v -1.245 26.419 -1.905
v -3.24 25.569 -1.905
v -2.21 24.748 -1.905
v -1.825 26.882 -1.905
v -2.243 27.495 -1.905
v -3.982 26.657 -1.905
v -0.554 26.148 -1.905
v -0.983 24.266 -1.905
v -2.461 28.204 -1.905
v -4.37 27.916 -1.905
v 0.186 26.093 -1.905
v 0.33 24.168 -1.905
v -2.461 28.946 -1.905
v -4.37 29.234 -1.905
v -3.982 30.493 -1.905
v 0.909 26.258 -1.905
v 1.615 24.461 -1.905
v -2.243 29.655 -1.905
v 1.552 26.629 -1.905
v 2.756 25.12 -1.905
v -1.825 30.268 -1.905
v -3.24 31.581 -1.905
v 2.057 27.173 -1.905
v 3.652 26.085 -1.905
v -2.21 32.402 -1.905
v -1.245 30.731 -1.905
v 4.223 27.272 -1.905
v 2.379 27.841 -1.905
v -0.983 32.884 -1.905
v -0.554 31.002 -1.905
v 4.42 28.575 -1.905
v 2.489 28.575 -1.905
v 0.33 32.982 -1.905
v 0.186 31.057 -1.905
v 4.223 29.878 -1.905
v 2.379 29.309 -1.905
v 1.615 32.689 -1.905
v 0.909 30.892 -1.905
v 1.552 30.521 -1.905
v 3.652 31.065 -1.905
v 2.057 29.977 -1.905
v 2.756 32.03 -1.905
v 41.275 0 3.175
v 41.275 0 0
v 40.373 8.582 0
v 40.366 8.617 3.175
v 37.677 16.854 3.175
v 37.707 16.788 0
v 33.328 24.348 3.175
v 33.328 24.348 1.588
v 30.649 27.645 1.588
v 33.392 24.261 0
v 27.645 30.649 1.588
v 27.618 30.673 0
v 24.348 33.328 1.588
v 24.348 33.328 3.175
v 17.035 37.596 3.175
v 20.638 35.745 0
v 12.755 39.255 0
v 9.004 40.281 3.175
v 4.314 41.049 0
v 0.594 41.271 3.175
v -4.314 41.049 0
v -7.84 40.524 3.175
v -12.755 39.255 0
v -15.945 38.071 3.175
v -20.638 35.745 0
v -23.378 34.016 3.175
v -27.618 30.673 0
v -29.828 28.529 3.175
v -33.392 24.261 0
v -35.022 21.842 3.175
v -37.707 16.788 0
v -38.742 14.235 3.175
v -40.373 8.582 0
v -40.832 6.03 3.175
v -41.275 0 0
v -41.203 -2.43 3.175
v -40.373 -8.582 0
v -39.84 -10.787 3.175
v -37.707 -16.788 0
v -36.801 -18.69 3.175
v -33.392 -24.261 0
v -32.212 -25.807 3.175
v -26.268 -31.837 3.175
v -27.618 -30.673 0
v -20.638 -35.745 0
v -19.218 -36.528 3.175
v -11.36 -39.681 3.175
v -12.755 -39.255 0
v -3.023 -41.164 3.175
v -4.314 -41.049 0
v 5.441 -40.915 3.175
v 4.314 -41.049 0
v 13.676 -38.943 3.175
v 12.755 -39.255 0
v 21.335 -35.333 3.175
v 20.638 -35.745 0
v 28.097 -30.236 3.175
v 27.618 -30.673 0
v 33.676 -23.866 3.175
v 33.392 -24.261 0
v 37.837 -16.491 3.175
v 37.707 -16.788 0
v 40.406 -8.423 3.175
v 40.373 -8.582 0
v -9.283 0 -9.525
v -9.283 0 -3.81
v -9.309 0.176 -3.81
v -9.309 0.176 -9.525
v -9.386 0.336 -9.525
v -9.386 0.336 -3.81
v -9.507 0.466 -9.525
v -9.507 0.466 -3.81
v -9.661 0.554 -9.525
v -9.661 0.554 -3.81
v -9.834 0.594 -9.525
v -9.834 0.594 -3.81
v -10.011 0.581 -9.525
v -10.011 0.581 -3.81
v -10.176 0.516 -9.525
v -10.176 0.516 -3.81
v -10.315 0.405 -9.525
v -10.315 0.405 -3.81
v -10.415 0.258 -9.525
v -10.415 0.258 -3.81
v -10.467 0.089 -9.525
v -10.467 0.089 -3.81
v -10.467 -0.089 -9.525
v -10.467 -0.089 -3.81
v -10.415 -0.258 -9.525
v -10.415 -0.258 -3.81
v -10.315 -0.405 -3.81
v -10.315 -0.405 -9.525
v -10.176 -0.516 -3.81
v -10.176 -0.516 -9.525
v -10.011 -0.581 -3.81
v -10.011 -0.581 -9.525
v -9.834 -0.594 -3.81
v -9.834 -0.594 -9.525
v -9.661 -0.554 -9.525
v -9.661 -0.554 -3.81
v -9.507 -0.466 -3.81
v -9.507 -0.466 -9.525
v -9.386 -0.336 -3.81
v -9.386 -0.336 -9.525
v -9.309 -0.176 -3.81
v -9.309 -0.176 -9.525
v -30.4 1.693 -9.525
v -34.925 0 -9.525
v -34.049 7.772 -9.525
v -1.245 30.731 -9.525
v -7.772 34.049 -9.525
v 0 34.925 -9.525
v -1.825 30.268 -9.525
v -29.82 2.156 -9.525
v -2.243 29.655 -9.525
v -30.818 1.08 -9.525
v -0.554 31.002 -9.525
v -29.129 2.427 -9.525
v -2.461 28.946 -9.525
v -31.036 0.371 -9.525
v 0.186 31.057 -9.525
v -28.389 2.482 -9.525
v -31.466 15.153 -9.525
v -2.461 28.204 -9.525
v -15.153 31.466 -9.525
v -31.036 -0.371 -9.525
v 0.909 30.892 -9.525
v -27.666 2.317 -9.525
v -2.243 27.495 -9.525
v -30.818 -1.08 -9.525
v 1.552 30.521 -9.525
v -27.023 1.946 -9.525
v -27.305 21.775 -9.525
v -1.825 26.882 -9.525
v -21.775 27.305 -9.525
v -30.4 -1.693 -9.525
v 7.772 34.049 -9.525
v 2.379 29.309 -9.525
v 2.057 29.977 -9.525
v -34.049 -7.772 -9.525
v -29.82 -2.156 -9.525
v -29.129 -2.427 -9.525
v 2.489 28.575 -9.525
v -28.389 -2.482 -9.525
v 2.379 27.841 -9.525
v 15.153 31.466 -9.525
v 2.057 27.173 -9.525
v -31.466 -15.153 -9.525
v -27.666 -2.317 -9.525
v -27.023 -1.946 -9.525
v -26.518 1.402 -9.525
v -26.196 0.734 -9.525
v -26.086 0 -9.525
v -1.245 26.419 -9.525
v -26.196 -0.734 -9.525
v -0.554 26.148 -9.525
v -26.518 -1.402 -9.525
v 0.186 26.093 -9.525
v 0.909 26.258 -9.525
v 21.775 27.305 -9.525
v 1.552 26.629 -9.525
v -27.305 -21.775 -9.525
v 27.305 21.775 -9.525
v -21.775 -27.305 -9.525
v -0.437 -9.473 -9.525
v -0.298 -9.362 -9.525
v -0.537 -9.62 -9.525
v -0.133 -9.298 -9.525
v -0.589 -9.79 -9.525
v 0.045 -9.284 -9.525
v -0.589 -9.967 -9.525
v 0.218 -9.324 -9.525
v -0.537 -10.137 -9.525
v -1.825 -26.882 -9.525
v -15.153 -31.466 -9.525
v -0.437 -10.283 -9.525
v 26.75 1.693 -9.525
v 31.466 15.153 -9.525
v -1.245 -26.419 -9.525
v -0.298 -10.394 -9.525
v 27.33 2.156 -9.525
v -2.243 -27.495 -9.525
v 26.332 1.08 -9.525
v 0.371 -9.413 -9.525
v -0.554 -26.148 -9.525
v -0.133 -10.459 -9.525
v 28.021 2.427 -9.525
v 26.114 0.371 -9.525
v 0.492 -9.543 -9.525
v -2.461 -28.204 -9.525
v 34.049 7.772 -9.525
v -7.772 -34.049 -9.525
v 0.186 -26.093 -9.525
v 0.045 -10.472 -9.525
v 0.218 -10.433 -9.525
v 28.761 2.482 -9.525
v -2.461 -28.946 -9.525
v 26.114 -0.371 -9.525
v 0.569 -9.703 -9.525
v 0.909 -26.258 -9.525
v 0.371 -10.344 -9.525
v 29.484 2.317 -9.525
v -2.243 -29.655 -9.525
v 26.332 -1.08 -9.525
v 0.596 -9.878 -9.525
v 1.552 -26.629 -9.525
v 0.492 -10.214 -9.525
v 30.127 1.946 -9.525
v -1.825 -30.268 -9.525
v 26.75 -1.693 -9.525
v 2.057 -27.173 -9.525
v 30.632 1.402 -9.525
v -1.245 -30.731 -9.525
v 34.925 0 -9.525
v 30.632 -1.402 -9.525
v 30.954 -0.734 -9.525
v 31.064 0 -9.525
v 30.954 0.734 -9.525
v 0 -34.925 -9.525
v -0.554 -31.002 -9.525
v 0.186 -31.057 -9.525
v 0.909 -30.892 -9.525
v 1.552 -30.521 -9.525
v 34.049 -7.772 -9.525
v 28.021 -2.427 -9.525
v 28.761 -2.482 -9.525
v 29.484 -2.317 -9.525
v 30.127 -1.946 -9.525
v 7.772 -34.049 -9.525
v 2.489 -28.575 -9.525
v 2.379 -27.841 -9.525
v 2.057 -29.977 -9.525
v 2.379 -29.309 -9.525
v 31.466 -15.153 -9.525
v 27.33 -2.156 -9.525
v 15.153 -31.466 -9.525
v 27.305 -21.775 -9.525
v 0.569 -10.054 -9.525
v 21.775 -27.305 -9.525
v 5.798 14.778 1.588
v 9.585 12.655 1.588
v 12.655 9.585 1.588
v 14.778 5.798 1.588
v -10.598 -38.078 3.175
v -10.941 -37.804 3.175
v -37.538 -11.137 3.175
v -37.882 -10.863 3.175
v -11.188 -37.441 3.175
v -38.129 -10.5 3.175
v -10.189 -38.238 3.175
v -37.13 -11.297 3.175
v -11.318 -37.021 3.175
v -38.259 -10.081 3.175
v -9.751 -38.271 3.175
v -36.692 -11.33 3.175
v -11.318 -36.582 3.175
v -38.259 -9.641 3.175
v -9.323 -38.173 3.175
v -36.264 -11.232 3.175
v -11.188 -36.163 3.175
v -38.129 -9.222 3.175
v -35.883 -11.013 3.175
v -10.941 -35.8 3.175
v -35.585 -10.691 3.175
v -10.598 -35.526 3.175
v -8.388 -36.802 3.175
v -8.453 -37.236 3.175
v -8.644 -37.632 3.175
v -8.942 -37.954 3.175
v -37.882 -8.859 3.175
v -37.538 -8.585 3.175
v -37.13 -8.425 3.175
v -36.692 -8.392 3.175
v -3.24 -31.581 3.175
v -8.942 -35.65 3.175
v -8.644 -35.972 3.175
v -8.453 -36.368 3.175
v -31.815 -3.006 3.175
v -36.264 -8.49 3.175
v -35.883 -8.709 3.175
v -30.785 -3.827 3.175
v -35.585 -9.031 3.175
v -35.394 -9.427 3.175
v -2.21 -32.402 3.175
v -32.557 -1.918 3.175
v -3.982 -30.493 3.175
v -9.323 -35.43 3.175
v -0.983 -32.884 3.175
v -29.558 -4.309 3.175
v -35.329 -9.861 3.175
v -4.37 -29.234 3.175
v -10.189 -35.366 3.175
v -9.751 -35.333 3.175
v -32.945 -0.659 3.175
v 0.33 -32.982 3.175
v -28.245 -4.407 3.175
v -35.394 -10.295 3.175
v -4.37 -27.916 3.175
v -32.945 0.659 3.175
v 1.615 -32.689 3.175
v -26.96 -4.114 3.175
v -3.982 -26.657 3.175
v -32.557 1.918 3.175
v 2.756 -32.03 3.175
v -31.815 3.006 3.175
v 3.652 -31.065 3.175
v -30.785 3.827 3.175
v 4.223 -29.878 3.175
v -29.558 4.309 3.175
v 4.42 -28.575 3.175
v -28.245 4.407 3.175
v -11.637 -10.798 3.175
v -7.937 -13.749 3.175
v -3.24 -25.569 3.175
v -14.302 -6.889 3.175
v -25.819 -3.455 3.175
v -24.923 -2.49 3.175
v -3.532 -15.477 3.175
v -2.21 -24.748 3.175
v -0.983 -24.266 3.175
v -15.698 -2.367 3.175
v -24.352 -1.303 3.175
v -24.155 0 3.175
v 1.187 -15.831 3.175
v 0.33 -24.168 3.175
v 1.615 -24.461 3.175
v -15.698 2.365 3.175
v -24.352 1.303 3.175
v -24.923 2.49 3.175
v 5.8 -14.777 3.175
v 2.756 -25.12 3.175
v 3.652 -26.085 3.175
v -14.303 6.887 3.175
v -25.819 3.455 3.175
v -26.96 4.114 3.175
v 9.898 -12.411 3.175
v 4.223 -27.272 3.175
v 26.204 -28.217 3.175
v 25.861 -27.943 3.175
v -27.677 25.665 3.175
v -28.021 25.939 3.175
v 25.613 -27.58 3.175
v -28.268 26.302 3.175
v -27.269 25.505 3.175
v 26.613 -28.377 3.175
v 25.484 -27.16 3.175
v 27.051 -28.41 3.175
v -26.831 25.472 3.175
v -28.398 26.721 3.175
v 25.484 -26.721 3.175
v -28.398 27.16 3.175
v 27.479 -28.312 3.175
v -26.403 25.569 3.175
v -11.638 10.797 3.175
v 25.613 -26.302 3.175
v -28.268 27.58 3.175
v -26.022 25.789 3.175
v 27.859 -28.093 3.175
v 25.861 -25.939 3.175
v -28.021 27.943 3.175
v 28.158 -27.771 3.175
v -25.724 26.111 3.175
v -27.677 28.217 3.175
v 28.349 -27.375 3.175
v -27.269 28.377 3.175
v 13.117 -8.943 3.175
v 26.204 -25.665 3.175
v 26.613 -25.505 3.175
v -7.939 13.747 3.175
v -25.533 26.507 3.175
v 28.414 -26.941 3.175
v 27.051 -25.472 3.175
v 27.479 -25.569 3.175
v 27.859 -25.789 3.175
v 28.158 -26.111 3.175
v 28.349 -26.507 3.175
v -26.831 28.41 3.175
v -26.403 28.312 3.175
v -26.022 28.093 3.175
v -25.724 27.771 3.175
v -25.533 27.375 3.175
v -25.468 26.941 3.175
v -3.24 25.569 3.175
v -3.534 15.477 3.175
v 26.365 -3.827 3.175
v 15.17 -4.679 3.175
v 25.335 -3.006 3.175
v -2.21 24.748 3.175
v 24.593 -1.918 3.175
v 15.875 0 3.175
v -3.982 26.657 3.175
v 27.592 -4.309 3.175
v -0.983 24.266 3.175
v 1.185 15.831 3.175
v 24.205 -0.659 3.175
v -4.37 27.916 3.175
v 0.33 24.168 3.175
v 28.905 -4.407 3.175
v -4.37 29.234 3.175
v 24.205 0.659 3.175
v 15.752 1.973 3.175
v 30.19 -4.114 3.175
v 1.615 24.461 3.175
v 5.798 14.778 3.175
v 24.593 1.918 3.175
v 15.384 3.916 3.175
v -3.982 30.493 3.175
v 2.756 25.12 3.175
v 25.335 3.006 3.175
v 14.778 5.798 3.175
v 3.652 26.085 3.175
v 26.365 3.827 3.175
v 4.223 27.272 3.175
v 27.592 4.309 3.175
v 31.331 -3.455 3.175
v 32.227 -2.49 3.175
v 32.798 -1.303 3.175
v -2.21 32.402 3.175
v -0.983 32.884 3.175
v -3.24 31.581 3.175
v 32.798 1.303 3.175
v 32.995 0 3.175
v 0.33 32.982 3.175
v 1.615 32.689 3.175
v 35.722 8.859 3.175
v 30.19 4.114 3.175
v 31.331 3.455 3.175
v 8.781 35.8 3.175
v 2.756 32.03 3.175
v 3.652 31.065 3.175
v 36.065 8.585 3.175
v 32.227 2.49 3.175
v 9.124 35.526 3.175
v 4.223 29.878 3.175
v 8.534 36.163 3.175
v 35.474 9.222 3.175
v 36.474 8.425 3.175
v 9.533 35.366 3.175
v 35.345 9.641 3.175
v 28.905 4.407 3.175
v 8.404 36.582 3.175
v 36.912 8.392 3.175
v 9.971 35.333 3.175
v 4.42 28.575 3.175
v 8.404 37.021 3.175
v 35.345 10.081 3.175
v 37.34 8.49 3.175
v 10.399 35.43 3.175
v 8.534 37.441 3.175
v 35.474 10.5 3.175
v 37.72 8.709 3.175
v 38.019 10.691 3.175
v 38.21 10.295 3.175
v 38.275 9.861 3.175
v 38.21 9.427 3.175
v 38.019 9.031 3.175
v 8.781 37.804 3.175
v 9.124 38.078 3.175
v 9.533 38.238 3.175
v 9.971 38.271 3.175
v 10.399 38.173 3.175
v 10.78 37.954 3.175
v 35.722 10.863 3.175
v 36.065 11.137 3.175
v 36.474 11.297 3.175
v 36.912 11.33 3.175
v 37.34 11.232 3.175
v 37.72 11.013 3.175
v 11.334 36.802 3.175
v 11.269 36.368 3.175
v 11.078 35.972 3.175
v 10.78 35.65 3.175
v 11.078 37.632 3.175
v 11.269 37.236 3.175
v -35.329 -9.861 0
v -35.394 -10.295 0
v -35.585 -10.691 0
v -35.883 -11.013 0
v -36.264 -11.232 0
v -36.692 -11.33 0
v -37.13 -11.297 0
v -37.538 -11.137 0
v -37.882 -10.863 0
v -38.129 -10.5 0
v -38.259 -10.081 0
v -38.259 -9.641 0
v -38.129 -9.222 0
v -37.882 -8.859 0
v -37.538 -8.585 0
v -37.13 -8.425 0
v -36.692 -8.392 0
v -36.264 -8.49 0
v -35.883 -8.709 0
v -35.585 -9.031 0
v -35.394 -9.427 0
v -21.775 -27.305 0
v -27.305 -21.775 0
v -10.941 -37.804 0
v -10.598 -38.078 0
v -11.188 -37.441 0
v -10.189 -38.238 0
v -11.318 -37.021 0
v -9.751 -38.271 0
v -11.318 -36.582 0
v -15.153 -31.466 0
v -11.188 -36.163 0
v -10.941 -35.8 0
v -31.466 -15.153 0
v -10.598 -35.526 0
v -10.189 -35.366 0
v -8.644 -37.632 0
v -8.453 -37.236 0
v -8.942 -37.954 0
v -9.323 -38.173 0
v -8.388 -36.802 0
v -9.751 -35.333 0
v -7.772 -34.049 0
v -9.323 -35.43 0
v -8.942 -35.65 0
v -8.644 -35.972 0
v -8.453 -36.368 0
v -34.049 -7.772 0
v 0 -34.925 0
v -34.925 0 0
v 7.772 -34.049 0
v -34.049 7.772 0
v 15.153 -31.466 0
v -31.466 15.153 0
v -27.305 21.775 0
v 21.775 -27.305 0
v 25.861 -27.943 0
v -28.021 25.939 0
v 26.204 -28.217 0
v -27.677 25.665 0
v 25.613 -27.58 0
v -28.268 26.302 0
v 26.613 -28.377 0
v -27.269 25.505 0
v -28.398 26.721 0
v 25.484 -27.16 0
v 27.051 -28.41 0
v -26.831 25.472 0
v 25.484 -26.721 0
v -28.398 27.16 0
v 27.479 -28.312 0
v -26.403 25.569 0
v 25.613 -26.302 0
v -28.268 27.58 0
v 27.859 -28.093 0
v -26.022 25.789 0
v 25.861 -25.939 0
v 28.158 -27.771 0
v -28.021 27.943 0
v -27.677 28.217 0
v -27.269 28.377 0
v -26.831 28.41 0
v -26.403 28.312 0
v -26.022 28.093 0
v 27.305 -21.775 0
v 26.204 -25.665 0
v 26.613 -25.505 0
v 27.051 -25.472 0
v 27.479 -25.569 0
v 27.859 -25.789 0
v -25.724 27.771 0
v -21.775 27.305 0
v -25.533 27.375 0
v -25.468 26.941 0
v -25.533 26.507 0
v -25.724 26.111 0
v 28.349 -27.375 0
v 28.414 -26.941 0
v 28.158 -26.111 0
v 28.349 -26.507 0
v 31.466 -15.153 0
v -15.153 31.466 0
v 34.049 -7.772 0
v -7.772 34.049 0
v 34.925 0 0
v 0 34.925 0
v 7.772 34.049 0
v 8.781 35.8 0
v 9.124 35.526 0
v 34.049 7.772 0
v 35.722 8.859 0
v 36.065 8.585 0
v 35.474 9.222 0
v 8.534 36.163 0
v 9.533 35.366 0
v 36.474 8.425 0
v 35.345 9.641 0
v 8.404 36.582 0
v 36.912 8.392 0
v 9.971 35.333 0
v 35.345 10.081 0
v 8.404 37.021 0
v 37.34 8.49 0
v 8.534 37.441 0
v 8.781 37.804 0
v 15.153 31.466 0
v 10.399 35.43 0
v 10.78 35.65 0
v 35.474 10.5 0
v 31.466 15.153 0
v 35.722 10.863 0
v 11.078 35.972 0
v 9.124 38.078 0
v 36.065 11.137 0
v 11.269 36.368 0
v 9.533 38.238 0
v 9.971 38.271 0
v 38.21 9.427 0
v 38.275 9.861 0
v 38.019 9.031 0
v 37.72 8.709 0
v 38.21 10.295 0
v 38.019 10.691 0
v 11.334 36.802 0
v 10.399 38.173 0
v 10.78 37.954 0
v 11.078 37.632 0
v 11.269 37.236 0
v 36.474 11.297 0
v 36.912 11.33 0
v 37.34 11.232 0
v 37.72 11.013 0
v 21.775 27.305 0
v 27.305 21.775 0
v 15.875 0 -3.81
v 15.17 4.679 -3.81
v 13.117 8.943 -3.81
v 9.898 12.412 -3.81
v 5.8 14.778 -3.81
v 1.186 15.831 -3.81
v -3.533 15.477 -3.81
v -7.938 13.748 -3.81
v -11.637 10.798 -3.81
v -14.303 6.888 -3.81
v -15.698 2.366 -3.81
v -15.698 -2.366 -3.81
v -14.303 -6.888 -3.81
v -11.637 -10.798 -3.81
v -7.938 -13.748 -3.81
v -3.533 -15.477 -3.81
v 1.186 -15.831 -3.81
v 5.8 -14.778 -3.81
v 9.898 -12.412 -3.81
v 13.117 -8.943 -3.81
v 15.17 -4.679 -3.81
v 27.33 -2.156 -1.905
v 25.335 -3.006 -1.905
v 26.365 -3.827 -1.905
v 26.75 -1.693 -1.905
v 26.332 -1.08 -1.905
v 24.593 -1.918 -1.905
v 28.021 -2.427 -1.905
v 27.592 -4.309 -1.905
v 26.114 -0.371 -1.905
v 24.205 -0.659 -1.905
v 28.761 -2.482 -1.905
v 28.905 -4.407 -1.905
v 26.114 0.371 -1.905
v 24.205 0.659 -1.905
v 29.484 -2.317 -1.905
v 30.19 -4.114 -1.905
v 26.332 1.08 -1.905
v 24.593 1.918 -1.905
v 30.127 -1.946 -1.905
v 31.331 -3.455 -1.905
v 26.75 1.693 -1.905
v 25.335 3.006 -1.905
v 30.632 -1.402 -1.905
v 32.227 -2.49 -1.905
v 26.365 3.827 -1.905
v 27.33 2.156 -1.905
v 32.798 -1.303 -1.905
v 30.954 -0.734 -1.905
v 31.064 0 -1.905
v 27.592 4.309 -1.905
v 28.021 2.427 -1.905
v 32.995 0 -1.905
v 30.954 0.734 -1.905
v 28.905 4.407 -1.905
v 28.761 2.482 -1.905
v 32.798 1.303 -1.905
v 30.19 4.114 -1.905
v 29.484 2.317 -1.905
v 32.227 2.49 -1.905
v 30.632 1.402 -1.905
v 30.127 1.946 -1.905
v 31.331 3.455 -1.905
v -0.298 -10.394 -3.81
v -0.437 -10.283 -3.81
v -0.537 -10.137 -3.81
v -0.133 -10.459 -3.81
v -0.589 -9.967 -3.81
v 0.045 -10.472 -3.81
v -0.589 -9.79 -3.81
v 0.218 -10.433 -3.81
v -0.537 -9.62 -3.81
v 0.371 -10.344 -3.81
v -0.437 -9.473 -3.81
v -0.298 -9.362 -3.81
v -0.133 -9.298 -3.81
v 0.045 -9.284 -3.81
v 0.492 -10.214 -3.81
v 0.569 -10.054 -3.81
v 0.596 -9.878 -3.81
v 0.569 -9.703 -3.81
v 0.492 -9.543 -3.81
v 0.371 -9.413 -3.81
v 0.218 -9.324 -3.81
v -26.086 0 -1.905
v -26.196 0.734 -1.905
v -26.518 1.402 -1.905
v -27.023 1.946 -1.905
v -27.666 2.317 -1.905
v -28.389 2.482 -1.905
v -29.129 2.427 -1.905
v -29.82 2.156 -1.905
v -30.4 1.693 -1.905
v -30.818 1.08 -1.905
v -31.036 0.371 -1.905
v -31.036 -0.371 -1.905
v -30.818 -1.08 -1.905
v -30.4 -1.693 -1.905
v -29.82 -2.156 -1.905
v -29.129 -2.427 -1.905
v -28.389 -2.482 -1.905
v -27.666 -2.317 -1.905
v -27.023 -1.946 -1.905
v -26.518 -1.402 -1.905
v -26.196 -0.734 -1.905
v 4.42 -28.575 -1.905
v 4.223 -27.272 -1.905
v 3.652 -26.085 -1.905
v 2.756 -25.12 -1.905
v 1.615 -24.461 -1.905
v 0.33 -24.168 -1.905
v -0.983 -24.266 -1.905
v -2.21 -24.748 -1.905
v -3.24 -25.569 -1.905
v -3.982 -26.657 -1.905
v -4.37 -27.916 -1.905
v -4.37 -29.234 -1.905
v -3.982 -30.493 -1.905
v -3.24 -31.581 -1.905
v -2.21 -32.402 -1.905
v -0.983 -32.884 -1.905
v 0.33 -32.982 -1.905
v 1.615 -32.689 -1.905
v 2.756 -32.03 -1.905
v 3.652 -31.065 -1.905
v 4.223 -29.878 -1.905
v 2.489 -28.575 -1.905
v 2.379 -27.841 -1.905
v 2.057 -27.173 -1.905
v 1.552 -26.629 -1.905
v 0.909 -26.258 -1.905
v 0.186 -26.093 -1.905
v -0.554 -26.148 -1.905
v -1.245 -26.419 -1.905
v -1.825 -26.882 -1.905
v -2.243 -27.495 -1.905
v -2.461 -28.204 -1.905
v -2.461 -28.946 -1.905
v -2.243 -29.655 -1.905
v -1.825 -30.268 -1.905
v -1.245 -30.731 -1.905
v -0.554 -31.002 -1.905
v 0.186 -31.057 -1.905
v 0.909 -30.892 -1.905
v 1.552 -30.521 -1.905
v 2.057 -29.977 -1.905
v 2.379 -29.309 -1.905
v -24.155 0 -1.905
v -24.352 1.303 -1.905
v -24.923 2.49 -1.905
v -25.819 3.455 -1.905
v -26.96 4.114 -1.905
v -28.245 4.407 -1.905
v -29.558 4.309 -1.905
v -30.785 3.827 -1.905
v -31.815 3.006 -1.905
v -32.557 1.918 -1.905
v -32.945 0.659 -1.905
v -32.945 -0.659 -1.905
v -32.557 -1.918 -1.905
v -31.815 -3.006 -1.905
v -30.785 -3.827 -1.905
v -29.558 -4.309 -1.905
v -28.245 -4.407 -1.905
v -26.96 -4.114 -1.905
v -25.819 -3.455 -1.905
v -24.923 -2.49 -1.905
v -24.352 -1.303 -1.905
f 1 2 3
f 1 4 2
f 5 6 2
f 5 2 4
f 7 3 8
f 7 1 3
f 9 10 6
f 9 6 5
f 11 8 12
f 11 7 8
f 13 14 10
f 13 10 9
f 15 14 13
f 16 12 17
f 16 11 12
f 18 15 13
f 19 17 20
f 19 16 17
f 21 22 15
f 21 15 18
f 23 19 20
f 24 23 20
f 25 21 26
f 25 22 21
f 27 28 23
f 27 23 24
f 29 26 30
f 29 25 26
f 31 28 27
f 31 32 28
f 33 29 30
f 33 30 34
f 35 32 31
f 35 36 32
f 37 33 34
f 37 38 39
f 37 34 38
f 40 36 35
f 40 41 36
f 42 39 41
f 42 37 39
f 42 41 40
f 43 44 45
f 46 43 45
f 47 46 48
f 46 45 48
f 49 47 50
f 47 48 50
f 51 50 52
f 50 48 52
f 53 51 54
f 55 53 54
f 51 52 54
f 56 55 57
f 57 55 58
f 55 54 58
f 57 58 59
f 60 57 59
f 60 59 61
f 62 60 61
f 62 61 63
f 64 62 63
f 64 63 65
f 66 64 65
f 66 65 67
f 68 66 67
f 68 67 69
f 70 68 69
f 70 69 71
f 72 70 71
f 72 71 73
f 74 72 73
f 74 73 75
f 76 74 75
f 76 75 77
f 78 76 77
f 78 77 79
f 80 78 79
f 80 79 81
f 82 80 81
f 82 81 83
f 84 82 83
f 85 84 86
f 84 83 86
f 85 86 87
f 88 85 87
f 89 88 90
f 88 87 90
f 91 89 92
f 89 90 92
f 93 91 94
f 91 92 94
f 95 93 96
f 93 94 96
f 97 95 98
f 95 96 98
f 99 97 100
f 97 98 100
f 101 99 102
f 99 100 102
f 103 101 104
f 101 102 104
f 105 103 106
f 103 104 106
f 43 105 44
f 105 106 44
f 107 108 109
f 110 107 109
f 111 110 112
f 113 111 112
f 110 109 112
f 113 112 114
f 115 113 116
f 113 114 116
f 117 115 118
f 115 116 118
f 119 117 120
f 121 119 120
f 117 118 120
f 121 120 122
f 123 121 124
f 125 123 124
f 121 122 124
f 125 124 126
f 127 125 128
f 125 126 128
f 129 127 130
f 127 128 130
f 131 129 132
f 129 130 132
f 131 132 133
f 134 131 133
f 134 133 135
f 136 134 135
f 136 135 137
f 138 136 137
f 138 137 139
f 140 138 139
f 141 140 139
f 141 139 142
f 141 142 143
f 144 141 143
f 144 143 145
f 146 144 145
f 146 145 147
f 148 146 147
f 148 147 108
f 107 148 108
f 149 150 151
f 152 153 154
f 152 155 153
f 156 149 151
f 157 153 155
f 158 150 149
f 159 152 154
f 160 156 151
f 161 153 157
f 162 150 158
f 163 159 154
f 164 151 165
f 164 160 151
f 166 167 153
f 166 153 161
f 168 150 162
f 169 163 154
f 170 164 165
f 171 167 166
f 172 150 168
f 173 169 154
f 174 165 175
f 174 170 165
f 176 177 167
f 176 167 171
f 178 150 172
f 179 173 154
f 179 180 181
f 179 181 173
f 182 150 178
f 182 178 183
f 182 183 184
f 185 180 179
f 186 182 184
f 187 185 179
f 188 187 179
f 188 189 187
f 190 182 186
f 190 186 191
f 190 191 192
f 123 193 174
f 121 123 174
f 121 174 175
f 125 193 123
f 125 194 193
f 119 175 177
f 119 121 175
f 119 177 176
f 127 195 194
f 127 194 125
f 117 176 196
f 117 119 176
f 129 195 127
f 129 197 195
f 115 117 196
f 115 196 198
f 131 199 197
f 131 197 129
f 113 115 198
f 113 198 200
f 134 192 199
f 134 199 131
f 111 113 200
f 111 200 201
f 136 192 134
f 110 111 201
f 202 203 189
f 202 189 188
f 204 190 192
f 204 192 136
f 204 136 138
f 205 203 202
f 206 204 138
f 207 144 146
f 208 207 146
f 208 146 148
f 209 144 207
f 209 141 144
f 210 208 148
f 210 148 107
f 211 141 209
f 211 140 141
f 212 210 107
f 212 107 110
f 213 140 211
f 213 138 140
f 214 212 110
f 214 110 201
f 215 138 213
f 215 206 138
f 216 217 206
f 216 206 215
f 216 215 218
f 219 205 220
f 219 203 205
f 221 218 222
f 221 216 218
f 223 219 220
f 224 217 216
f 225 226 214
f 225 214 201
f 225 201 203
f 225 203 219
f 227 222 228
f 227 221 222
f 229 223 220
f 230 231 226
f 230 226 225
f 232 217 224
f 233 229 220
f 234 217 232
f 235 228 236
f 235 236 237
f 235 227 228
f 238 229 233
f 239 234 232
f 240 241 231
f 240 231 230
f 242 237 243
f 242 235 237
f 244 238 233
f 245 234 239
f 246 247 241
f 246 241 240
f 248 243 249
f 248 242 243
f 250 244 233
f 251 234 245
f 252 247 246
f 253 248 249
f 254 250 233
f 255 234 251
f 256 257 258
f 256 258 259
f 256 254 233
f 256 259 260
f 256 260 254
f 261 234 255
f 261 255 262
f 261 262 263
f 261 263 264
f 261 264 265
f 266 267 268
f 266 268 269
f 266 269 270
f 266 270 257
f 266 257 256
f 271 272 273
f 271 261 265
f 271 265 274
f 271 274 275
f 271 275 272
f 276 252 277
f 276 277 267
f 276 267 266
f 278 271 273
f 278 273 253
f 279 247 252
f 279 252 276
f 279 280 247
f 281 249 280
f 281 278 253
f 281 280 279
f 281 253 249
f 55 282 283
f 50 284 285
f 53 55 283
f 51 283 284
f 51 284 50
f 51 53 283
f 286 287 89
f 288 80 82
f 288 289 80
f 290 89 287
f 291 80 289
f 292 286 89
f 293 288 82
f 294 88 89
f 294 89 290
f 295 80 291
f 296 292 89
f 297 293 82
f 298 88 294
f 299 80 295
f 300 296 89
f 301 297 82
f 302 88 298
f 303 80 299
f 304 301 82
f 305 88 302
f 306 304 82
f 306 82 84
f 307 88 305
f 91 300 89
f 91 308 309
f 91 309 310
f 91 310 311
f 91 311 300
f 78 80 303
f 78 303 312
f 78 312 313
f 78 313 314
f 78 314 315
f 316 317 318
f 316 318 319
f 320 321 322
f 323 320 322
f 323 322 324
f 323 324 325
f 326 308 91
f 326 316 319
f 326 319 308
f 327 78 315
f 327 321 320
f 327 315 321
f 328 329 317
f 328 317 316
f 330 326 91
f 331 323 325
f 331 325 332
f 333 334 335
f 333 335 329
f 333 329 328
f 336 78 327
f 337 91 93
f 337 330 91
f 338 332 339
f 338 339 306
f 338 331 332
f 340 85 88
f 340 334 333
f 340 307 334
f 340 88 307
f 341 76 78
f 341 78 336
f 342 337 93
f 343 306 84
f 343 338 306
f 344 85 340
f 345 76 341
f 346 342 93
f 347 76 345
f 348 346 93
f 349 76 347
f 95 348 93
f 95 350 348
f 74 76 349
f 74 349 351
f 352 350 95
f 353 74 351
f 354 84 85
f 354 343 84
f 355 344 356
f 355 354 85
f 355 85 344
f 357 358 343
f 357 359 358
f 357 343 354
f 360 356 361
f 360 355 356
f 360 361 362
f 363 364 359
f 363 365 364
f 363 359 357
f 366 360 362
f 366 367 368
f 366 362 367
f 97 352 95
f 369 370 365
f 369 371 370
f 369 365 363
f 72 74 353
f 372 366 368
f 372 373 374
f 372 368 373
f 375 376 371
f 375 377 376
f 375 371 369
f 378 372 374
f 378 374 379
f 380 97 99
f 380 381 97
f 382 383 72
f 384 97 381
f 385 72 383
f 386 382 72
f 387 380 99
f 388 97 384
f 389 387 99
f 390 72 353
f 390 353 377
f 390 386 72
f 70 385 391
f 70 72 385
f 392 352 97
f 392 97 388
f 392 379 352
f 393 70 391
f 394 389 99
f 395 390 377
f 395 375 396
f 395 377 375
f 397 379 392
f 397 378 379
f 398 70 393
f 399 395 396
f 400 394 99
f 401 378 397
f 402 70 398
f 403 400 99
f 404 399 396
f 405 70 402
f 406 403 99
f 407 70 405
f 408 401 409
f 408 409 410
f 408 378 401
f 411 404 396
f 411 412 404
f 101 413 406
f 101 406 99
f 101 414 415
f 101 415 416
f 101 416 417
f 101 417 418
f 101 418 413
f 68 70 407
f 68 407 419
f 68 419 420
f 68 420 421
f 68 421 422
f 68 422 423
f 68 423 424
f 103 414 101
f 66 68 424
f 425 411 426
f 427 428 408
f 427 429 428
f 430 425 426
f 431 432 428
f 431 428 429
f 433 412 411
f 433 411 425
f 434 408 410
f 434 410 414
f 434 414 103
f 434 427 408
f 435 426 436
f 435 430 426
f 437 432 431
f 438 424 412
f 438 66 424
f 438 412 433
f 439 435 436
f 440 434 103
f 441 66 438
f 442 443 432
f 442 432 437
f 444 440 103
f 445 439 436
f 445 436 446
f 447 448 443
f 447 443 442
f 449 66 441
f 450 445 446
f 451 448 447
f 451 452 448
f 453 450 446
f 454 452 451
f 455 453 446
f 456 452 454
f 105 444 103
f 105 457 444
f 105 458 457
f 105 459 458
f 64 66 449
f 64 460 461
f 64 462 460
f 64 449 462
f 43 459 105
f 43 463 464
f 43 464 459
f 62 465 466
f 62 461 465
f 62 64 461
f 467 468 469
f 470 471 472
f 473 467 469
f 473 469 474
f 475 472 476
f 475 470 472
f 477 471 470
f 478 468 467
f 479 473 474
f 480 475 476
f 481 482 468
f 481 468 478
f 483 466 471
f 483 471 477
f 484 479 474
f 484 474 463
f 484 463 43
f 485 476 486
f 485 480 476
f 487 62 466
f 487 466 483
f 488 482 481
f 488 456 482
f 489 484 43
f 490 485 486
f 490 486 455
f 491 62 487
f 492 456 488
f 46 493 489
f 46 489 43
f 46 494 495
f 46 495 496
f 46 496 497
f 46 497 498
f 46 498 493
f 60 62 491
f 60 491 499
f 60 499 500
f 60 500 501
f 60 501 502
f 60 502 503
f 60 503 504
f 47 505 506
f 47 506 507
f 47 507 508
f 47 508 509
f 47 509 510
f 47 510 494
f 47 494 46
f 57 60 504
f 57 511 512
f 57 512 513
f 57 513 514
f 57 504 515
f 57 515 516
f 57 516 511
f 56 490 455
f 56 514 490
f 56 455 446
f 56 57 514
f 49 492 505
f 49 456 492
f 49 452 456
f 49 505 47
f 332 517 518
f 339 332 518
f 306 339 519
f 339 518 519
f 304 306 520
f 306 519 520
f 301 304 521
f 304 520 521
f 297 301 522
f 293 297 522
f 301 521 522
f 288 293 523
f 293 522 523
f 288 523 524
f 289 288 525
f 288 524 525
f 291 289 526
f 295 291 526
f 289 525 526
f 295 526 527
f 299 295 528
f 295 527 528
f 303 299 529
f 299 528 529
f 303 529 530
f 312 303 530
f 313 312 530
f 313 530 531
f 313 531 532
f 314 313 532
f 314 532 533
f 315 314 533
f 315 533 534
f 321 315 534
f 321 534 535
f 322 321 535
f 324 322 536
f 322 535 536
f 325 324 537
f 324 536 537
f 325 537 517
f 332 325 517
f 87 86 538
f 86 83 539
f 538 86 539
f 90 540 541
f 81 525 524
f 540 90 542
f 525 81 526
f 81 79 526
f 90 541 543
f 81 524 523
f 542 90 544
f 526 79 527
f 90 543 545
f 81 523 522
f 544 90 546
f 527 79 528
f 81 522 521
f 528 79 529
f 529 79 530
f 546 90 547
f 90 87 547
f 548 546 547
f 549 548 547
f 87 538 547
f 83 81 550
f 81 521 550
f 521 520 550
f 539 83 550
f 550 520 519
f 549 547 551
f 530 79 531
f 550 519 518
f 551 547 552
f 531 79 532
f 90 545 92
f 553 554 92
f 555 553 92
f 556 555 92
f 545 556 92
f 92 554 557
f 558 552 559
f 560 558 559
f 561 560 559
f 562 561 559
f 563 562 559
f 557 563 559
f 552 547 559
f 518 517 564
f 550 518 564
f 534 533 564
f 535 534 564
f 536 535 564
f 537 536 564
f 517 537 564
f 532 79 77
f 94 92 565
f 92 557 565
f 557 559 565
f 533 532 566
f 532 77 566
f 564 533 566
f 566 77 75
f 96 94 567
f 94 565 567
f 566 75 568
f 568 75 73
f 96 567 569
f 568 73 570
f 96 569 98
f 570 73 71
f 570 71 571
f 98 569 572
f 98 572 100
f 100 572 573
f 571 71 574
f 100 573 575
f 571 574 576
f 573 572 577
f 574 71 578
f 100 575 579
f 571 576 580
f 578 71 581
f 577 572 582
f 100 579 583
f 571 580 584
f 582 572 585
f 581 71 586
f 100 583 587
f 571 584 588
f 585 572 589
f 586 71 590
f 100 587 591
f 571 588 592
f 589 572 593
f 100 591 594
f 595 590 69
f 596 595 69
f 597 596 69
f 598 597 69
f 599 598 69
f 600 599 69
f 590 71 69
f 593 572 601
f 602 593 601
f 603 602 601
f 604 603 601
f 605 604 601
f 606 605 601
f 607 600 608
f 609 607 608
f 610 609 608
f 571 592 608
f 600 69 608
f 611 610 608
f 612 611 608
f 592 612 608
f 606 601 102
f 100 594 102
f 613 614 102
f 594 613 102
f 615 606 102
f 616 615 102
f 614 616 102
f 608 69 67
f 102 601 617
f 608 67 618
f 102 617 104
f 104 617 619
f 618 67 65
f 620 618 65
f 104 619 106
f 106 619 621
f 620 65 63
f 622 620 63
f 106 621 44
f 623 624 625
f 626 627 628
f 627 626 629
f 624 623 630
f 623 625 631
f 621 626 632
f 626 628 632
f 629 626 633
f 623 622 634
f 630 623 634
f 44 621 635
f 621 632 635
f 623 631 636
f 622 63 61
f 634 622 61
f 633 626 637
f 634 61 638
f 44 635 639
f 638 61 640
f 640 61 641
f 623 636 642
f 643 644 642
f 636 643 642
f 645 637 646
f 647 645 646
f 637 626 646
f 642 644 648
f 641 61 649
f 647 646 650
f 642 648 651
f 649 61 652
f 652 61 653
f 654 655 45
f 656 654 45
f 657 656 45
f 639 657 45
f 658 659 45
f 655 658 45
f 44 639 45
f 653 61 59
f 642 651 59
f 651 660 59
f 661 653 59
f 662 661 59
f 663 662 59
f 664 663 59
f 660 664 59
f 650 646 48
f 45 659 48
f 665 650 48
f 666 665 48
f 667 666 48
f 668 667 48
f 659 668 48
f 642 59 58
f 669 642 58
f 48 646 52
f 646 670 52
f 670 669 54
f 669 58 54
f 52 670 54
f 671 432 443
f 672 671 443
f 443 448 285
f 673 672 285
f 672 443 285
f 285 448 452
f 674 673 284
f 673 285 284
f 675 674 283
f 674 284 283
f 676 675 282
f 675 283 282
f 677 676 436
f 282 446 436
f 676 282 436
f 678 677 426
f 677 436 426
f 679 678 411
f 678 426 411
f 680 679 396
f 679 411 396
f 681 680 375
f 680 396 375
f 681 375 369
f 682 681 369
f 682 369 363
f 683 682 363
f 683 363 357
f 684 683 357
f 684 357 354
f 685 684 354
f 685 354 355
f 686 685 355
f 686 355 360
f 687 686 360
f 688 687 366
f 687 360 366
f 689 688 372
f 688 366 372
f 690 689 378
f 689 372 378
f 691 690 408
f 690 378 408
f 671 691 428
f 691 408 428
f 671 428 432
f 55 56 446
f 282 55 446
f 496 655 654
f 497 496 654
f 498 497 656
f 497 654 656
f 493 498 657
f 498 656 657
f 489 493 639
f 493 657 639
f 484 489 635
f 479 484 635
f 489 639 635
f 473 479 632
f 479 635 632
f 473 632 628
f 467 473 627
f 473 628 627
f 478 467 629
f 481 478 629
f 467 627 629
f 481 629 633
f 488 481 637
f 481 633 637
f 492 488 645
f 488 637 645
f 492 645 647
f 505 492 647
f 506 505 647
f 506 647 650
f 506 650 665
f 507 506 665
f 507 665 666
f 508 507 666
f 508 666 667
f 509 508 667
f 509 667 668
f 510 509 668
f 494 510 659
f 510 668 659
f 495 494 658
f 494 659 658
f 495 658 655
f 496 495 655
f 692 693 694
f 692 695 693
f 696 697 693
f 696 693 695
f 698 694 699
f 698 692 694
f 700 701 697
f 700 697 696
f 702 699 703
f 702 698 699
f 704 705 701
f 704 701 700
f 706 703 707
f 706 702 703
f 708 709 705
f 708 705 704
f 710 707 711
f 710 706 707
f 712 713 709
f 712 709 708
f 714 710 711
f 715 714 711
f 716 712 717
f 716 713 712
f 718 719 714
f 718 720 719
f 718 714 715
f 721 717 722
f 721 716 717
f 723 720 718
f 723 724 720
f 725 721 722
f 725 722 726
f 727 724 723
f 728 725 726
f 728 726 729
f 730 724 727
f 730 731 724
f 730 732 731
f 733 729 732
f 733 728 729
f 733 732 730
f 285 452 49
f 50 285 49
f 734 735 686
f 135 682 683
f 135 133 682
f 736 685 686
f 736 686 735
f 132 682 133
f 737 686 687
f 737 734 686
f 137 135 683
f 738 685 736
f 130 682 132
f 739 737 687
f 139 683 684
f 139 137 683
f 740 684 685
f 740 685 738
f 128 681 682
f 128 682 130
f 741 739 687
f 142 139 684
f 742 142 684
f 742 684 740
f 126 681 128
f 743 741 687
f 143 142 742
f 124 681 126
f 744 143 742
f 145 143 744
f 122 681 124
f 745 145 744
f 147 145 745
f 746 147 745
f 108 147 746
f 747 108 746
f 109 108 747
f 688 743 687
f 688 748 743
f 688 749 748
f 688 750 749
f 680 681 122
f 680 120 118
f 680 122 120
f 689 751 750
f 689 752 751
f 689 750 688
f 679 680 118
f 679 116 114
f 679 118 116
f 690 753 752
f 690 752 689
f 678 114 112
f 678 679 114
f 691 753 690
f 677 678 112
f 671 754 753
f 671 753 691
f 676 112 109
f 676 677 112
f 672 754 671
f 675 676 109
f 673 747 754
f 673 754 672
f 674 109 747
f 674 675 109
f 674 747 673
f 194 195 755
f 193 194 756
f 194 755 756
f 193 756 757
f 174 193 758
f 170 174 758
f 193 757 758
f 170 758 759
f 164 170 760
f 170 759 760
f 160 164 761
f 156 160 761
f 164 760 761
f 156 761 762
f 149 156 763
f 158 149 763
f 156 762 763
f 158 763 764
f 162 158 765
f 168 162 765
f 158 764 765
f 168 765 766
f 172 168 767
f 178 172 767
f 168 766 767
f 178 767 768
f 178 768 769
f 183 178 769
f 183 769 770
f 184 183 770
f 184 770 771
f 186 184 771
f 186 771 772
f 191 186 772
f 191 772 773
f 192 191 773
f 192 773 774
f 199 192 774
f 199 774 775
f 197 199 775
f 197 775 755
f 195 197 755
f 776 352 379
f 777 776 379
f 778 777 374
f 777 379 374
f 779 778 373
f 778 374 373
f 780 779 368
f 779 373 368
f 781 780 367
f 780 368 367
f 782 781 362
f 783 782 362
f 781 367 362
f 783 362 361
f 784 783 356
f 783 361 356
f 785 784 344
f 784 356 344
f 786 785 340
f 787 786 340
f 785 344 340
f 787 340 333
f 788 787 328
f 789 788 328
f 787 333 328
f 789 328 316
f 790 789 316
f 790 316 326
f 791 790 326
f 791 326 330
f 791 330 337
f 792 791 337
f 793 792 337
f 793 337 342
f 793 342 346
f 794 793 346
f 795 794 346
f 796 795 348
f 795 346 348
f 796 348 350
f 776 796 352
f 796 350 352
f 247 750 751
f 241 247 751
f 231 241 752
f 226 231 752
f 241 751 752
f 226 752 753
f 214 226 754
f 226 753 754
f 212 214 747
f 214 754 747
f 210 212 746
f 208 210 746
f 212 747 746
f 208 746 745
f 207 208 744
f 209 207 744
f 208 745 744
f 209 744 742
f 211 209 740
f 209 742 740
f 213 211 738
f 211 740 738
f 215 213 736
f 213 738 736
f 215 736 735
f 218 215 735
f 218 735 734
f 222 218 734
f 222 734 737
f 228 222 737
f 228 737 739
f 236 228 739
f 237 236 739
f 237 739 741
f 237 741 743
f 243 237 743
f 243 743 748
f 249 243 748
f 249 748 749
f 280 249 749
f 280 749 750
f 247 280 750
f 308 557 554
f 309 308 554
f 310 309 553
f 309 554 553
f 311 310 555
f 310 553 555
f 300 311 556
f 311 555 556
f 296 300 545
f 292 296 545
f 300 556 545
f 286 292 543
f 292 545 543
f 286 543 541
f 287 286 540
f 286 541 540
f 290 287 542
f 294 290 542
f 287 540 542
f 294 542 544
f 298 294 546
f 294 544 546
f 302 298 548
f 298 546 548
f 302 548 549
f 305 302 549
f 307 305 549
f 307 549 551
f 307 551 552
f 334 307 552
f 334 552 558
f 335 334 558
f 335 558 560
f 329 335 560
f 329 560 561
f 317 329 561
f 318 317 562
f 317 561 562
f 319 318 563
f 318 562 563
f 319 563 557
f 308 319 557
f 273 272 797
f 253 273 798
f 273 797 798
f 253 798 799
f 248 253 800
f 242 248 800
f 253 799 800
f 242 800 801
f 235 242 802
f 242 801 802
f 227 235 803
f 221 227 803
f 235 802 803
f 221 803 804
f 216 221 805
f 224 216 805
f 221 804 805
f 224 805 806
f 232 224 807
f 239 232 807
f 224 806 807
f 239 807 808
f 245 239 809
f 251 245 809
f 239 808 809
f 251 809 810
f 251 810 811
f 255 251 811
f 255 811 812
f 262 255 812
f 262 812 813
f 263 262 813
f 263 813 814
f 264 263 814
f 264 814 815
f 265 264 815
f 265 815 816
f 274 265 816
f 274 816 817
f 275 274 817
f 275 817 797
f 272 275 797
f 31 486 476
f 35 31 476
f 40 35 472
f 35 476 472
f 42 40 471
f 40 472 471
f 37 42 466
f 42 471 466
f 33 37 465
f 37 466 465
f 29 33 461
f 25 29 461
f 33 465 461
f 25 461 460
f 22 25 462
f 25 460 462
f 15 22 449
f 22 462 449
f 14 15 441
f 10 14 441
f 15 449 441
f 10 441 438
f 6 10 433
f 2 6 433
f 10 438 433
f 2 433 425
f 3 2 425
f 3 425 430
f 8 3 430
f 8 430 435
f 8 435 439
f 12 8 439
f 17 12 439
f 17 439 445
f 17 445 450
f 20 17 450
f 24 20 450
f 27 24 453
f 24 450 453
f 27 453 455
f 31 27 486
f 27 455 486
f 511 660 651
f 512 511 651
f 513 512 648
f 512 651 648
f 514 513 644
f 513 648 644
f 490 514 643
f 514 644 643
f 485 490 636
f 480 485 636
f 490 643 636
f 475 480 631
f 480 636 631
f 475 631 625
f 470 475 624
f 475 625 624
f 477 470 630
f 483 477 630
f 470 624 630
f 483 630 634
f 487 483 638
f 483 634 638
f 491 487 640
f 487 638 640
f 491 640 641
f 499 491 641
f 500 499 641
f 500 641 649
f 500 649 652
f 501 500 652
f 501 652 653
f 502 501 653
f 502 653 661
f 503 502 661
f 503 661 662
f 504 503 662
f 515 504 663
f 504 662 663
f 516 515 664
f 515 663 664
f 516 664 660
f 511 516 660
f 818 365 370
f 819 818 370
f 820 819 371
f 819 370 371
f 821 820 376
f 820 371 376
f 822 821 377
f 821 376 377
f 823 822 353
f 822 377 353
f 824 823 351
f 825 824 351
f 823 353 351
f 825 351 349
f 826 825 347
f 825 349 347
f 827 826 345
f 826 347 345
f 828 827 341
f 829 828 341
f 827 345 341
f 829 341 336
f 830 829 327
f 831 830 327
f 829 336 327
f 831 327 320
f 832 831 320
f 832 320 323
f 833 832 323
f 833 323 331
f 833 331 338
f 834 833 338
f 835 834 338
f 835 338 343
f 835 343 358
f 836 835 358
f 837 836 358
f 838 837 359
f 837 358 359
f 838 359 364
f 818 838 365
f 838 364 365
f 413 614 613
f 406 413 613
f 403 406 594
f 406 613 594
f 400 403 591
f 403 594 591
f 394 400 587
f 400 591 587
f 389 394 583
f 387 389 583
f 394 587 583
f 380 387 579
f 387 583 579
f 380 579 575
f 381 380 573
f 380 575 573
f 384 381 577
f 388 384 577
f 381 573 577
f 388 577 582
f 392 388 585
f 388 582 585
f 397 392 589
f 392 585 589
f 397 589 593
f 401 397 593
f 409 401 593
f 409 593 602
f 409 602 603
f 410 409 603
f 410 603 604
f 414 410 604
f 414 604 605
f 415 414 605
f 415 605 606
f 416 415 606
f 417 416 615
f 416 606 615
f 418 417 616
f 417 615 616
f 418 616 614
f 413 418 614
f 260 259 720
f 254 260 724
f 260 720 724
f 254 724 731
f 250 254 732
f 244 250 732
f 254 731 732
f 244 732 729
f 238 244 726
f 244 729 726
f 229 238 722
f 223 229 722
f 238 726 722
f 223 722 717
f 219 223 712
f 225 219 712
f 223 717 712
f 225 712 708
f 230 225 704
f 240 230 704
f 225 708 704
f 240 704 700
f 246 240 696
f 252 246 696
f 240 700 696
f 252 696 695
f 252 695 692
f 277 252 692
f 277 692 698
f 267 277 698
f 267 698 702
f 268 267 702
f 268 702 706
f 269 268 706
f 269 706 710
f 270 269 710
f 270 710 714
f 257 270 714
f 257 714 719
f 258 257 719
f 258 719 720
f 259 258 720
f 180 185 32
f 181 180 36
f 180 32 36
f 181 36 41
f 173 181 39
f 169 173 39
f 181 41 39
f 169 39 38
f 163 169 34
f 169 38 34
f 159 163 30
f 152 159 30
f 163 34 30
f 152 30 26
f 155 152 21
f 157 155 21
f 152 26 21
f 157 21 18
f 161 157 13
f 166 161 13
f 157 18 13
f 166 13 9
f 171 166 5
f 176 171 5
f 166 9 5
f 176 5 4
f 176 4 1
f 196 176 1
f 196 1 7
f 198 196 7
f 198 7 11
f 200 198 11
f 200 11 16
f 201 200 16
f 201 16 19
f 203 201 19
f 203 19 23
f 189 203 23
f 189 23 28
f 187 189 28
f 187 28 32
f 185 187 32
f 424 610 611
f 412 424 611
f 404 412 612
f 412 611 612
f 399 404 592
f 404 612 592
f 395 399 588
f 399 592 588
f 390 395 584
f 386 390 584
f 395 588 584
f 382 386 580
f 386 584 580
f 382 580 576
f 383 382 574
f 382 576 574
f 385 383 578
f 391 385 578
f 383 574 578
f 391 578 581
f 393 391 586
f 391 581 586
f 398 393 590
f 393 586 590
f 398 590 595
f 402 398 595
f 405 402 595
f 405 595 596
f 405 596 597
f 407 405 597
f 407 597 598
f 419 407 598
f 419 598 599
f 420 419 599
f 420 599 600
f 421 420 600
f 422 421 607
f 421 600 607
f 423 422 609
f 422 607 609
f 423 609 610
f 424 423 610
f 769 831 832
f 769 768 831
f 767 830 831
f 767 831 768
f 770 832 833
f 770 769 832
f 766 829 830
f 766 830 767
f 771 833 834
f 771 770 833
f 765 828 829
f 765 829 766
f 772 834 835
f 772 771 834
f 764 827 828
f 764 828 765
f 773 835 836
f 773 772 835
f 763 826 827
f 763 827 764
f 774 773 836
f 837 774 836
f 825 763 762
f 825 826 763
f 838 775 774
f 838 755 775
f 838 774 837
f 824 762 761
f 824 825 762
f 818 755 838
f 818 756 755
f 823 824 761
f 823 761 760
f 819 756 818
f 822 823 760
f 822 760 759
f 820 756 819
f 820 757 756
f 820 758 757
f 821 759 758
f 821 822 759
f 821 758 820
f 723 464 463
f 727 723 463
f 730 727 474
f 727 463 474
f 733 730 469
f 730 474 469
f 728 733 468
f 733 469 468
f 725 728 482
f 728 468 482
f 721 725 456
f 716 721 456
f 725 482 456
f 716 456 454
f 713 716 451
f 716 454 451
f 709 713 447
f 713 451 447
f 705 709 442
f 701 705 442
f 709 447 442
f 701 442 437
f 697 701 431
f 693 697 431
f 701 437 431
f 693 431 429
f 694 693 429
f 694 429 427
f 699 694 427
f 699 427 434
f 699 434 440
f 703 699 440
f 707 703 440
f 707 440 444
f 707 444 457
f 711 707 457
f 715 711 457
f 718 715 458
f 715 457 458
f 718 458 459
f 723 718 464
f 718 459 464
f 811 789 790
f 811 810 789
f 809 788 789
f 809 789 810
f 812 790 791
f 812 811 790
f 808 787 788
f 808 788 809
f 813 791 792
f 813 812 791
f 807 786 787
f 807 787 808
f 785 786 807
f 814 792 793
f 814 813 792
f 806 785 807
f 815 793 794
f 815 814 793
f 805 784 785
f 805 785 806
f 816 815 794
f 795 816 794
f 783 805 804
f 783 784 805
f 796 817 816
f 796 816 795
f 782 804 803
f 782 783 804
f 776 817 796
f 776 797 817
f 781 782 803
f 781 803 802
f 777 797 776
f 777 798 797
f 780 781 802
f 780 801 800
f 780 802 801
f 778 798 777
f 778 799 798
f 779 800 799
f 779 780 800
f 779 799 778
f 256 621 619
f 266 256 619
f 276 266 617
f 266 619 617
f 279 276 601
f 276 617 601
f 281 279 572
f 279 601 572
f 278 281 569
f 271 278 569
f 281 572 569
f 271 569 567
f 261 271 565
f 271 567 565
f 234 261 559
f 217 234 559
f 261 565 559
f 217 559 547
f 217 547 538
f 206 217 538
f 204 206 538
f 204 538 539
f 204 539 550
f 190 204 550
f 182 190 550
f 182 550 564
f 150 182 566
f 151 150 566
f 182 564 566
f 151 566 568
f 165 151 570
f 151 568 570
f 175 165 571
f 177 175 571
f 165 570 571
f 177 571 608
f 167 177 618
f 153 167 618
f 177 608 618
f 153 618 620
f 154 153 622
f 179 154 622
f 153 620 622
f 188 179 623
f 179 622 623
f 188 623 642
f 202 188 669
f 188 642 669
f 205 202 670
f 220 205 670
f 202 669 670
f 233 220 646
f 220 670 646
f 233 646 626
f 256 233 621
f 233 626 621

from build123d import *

# Parameters (mm, degrees)
F0_R      = 41.275
F1_DEPTH  = 3.175
F2_R      = 34.925
F3_DEPTH  = 9.525
F4_R      = 2.4892
F5_DEPTH  = 12.7
F6_R      = 4.4196
F7_DEPTH  = 5.08
F8_R      = 1.4732
F9_DEPTH  = 3.175
F10_R     = 15.875
F11_DEPTH = 6.985
F12_R     = 0.59563
F13_DEPTH = 5.716
F15_DEPTH = 1.5875


with BuildPart() as f1:
    # F0 (on Top) → F1 (new body)
    with BuildSketch(Plane.XY):
        Circle(F0_R)
    extrude(amount=F1_DEPTH)

    # F2 (on face) → F3 (join)
    with BuildSketch(Plane(origin=(0, 0, 0), x_dir=(1, 0, 0), z_dir=(0, 0, -1))):
        Circle(F2_R)
    extrude(amount=F3_DEPTH)

    # F4 (on face) → F5 (cut, through all)
    with BuildSketch(Plane.XY.offset(3.175)):
        with Locations((0, 28.575)):
            Circle(F4_R)
        with Locations((-28.575, 0)):
            Circle(F4_R)
        with Locations((0, -28.575)):
            Circle(F4_R)
        with Locations((28.575, 0)):
            Circle(F4_R)
    extrude(amount=-F5_DEPTH, mode=Mode.SUBTRACT)

    # F6 (on face) → F7 (cut)
    with BuildSketch(Plane.XY.offset(3.175)):
        with Locations((0, 28.575)):
            Circle(F6_R)
        with Locations((-28.575, 0)):
            Circle(F6_R)
        with Locations((0, -28.575)):
            Circle(F6_R)
        with Locations((28.575, 0)):
            Circle(F6_R)
    extrude(amount=-F7_DEPTH, mode=Mode.SUBTRACT)

    # F8 (on face) → F9 (cut, through all)
    with BuildSketch(Plane(origin=(0, 0, 0), x_dir=(1, 0, 0), z_dir=(0, 0, -1))):
        with Locations((9.8610056184, -36.8017739816)):
            Circle(F8_R)
        with Locations((36.8017739816, -9.8610056184)):
            Circle(F8_R)
        with Locations((26.9407683632, 26.9407683632)):
            Circle(F8_R)
        with Locations((-9.8610056184, 36.8017739816)):
            Circle(F8_R)
        with Locations((-36.8017739816, 9.8610056184)):
            Circle(F8_R)
        with Locations((-26.9407683632, -26.9407683632)):
            Circle(F8_R)
    extrude(amount=-F9_DEPTH, mode=Mode.SUBTRACT)

    # F10 (on face) → F11 (cut)
    with BuildSketch(Plane.XY.offset(3.175)):
        Circle(F10_R)
    extrude(amount=-F11_DEPTH, mode=Mode.SUBTRACT)

    # F12 (on face) → F13 (cut, through all)
    with BuildSketch(Plane.XY.offset(-3.81)):
        with Locations((-9.8782817332, 0)):
            Circle(F12_R)
        with Locations((0, -9.8782817332)):
            Circle(F12_R)
    extrude(amount=-F13_DEPTH, mode=Mode.SUBTRACT)

    # F14 (on face) → F15 (cut)
    with BuildSketch(Plane.XY.offset(3.175)):
        with BuildLine():
            Line((24.3482415622, 33.3284976833), (5.7980477982, 14.7783039193))
            ThreePointArc((5.7980477982, 14.7783039193), (11.2253201513, 11.2253201513), (14.7783039193, 5.7980477982))
            Line((14.7783039193, 5.7980477982), (33.3284976833, 24.3482415622))
            ThreePointArc((33.3284976833, 24.3482415622), (29.1858323935, 29.1858323935), (24.3482415622, 33.3284976833))
        make_face()
    extrude(amount=-F15_DEPTH, mode=Mode.SUBTRACT)


solid = f1.part
